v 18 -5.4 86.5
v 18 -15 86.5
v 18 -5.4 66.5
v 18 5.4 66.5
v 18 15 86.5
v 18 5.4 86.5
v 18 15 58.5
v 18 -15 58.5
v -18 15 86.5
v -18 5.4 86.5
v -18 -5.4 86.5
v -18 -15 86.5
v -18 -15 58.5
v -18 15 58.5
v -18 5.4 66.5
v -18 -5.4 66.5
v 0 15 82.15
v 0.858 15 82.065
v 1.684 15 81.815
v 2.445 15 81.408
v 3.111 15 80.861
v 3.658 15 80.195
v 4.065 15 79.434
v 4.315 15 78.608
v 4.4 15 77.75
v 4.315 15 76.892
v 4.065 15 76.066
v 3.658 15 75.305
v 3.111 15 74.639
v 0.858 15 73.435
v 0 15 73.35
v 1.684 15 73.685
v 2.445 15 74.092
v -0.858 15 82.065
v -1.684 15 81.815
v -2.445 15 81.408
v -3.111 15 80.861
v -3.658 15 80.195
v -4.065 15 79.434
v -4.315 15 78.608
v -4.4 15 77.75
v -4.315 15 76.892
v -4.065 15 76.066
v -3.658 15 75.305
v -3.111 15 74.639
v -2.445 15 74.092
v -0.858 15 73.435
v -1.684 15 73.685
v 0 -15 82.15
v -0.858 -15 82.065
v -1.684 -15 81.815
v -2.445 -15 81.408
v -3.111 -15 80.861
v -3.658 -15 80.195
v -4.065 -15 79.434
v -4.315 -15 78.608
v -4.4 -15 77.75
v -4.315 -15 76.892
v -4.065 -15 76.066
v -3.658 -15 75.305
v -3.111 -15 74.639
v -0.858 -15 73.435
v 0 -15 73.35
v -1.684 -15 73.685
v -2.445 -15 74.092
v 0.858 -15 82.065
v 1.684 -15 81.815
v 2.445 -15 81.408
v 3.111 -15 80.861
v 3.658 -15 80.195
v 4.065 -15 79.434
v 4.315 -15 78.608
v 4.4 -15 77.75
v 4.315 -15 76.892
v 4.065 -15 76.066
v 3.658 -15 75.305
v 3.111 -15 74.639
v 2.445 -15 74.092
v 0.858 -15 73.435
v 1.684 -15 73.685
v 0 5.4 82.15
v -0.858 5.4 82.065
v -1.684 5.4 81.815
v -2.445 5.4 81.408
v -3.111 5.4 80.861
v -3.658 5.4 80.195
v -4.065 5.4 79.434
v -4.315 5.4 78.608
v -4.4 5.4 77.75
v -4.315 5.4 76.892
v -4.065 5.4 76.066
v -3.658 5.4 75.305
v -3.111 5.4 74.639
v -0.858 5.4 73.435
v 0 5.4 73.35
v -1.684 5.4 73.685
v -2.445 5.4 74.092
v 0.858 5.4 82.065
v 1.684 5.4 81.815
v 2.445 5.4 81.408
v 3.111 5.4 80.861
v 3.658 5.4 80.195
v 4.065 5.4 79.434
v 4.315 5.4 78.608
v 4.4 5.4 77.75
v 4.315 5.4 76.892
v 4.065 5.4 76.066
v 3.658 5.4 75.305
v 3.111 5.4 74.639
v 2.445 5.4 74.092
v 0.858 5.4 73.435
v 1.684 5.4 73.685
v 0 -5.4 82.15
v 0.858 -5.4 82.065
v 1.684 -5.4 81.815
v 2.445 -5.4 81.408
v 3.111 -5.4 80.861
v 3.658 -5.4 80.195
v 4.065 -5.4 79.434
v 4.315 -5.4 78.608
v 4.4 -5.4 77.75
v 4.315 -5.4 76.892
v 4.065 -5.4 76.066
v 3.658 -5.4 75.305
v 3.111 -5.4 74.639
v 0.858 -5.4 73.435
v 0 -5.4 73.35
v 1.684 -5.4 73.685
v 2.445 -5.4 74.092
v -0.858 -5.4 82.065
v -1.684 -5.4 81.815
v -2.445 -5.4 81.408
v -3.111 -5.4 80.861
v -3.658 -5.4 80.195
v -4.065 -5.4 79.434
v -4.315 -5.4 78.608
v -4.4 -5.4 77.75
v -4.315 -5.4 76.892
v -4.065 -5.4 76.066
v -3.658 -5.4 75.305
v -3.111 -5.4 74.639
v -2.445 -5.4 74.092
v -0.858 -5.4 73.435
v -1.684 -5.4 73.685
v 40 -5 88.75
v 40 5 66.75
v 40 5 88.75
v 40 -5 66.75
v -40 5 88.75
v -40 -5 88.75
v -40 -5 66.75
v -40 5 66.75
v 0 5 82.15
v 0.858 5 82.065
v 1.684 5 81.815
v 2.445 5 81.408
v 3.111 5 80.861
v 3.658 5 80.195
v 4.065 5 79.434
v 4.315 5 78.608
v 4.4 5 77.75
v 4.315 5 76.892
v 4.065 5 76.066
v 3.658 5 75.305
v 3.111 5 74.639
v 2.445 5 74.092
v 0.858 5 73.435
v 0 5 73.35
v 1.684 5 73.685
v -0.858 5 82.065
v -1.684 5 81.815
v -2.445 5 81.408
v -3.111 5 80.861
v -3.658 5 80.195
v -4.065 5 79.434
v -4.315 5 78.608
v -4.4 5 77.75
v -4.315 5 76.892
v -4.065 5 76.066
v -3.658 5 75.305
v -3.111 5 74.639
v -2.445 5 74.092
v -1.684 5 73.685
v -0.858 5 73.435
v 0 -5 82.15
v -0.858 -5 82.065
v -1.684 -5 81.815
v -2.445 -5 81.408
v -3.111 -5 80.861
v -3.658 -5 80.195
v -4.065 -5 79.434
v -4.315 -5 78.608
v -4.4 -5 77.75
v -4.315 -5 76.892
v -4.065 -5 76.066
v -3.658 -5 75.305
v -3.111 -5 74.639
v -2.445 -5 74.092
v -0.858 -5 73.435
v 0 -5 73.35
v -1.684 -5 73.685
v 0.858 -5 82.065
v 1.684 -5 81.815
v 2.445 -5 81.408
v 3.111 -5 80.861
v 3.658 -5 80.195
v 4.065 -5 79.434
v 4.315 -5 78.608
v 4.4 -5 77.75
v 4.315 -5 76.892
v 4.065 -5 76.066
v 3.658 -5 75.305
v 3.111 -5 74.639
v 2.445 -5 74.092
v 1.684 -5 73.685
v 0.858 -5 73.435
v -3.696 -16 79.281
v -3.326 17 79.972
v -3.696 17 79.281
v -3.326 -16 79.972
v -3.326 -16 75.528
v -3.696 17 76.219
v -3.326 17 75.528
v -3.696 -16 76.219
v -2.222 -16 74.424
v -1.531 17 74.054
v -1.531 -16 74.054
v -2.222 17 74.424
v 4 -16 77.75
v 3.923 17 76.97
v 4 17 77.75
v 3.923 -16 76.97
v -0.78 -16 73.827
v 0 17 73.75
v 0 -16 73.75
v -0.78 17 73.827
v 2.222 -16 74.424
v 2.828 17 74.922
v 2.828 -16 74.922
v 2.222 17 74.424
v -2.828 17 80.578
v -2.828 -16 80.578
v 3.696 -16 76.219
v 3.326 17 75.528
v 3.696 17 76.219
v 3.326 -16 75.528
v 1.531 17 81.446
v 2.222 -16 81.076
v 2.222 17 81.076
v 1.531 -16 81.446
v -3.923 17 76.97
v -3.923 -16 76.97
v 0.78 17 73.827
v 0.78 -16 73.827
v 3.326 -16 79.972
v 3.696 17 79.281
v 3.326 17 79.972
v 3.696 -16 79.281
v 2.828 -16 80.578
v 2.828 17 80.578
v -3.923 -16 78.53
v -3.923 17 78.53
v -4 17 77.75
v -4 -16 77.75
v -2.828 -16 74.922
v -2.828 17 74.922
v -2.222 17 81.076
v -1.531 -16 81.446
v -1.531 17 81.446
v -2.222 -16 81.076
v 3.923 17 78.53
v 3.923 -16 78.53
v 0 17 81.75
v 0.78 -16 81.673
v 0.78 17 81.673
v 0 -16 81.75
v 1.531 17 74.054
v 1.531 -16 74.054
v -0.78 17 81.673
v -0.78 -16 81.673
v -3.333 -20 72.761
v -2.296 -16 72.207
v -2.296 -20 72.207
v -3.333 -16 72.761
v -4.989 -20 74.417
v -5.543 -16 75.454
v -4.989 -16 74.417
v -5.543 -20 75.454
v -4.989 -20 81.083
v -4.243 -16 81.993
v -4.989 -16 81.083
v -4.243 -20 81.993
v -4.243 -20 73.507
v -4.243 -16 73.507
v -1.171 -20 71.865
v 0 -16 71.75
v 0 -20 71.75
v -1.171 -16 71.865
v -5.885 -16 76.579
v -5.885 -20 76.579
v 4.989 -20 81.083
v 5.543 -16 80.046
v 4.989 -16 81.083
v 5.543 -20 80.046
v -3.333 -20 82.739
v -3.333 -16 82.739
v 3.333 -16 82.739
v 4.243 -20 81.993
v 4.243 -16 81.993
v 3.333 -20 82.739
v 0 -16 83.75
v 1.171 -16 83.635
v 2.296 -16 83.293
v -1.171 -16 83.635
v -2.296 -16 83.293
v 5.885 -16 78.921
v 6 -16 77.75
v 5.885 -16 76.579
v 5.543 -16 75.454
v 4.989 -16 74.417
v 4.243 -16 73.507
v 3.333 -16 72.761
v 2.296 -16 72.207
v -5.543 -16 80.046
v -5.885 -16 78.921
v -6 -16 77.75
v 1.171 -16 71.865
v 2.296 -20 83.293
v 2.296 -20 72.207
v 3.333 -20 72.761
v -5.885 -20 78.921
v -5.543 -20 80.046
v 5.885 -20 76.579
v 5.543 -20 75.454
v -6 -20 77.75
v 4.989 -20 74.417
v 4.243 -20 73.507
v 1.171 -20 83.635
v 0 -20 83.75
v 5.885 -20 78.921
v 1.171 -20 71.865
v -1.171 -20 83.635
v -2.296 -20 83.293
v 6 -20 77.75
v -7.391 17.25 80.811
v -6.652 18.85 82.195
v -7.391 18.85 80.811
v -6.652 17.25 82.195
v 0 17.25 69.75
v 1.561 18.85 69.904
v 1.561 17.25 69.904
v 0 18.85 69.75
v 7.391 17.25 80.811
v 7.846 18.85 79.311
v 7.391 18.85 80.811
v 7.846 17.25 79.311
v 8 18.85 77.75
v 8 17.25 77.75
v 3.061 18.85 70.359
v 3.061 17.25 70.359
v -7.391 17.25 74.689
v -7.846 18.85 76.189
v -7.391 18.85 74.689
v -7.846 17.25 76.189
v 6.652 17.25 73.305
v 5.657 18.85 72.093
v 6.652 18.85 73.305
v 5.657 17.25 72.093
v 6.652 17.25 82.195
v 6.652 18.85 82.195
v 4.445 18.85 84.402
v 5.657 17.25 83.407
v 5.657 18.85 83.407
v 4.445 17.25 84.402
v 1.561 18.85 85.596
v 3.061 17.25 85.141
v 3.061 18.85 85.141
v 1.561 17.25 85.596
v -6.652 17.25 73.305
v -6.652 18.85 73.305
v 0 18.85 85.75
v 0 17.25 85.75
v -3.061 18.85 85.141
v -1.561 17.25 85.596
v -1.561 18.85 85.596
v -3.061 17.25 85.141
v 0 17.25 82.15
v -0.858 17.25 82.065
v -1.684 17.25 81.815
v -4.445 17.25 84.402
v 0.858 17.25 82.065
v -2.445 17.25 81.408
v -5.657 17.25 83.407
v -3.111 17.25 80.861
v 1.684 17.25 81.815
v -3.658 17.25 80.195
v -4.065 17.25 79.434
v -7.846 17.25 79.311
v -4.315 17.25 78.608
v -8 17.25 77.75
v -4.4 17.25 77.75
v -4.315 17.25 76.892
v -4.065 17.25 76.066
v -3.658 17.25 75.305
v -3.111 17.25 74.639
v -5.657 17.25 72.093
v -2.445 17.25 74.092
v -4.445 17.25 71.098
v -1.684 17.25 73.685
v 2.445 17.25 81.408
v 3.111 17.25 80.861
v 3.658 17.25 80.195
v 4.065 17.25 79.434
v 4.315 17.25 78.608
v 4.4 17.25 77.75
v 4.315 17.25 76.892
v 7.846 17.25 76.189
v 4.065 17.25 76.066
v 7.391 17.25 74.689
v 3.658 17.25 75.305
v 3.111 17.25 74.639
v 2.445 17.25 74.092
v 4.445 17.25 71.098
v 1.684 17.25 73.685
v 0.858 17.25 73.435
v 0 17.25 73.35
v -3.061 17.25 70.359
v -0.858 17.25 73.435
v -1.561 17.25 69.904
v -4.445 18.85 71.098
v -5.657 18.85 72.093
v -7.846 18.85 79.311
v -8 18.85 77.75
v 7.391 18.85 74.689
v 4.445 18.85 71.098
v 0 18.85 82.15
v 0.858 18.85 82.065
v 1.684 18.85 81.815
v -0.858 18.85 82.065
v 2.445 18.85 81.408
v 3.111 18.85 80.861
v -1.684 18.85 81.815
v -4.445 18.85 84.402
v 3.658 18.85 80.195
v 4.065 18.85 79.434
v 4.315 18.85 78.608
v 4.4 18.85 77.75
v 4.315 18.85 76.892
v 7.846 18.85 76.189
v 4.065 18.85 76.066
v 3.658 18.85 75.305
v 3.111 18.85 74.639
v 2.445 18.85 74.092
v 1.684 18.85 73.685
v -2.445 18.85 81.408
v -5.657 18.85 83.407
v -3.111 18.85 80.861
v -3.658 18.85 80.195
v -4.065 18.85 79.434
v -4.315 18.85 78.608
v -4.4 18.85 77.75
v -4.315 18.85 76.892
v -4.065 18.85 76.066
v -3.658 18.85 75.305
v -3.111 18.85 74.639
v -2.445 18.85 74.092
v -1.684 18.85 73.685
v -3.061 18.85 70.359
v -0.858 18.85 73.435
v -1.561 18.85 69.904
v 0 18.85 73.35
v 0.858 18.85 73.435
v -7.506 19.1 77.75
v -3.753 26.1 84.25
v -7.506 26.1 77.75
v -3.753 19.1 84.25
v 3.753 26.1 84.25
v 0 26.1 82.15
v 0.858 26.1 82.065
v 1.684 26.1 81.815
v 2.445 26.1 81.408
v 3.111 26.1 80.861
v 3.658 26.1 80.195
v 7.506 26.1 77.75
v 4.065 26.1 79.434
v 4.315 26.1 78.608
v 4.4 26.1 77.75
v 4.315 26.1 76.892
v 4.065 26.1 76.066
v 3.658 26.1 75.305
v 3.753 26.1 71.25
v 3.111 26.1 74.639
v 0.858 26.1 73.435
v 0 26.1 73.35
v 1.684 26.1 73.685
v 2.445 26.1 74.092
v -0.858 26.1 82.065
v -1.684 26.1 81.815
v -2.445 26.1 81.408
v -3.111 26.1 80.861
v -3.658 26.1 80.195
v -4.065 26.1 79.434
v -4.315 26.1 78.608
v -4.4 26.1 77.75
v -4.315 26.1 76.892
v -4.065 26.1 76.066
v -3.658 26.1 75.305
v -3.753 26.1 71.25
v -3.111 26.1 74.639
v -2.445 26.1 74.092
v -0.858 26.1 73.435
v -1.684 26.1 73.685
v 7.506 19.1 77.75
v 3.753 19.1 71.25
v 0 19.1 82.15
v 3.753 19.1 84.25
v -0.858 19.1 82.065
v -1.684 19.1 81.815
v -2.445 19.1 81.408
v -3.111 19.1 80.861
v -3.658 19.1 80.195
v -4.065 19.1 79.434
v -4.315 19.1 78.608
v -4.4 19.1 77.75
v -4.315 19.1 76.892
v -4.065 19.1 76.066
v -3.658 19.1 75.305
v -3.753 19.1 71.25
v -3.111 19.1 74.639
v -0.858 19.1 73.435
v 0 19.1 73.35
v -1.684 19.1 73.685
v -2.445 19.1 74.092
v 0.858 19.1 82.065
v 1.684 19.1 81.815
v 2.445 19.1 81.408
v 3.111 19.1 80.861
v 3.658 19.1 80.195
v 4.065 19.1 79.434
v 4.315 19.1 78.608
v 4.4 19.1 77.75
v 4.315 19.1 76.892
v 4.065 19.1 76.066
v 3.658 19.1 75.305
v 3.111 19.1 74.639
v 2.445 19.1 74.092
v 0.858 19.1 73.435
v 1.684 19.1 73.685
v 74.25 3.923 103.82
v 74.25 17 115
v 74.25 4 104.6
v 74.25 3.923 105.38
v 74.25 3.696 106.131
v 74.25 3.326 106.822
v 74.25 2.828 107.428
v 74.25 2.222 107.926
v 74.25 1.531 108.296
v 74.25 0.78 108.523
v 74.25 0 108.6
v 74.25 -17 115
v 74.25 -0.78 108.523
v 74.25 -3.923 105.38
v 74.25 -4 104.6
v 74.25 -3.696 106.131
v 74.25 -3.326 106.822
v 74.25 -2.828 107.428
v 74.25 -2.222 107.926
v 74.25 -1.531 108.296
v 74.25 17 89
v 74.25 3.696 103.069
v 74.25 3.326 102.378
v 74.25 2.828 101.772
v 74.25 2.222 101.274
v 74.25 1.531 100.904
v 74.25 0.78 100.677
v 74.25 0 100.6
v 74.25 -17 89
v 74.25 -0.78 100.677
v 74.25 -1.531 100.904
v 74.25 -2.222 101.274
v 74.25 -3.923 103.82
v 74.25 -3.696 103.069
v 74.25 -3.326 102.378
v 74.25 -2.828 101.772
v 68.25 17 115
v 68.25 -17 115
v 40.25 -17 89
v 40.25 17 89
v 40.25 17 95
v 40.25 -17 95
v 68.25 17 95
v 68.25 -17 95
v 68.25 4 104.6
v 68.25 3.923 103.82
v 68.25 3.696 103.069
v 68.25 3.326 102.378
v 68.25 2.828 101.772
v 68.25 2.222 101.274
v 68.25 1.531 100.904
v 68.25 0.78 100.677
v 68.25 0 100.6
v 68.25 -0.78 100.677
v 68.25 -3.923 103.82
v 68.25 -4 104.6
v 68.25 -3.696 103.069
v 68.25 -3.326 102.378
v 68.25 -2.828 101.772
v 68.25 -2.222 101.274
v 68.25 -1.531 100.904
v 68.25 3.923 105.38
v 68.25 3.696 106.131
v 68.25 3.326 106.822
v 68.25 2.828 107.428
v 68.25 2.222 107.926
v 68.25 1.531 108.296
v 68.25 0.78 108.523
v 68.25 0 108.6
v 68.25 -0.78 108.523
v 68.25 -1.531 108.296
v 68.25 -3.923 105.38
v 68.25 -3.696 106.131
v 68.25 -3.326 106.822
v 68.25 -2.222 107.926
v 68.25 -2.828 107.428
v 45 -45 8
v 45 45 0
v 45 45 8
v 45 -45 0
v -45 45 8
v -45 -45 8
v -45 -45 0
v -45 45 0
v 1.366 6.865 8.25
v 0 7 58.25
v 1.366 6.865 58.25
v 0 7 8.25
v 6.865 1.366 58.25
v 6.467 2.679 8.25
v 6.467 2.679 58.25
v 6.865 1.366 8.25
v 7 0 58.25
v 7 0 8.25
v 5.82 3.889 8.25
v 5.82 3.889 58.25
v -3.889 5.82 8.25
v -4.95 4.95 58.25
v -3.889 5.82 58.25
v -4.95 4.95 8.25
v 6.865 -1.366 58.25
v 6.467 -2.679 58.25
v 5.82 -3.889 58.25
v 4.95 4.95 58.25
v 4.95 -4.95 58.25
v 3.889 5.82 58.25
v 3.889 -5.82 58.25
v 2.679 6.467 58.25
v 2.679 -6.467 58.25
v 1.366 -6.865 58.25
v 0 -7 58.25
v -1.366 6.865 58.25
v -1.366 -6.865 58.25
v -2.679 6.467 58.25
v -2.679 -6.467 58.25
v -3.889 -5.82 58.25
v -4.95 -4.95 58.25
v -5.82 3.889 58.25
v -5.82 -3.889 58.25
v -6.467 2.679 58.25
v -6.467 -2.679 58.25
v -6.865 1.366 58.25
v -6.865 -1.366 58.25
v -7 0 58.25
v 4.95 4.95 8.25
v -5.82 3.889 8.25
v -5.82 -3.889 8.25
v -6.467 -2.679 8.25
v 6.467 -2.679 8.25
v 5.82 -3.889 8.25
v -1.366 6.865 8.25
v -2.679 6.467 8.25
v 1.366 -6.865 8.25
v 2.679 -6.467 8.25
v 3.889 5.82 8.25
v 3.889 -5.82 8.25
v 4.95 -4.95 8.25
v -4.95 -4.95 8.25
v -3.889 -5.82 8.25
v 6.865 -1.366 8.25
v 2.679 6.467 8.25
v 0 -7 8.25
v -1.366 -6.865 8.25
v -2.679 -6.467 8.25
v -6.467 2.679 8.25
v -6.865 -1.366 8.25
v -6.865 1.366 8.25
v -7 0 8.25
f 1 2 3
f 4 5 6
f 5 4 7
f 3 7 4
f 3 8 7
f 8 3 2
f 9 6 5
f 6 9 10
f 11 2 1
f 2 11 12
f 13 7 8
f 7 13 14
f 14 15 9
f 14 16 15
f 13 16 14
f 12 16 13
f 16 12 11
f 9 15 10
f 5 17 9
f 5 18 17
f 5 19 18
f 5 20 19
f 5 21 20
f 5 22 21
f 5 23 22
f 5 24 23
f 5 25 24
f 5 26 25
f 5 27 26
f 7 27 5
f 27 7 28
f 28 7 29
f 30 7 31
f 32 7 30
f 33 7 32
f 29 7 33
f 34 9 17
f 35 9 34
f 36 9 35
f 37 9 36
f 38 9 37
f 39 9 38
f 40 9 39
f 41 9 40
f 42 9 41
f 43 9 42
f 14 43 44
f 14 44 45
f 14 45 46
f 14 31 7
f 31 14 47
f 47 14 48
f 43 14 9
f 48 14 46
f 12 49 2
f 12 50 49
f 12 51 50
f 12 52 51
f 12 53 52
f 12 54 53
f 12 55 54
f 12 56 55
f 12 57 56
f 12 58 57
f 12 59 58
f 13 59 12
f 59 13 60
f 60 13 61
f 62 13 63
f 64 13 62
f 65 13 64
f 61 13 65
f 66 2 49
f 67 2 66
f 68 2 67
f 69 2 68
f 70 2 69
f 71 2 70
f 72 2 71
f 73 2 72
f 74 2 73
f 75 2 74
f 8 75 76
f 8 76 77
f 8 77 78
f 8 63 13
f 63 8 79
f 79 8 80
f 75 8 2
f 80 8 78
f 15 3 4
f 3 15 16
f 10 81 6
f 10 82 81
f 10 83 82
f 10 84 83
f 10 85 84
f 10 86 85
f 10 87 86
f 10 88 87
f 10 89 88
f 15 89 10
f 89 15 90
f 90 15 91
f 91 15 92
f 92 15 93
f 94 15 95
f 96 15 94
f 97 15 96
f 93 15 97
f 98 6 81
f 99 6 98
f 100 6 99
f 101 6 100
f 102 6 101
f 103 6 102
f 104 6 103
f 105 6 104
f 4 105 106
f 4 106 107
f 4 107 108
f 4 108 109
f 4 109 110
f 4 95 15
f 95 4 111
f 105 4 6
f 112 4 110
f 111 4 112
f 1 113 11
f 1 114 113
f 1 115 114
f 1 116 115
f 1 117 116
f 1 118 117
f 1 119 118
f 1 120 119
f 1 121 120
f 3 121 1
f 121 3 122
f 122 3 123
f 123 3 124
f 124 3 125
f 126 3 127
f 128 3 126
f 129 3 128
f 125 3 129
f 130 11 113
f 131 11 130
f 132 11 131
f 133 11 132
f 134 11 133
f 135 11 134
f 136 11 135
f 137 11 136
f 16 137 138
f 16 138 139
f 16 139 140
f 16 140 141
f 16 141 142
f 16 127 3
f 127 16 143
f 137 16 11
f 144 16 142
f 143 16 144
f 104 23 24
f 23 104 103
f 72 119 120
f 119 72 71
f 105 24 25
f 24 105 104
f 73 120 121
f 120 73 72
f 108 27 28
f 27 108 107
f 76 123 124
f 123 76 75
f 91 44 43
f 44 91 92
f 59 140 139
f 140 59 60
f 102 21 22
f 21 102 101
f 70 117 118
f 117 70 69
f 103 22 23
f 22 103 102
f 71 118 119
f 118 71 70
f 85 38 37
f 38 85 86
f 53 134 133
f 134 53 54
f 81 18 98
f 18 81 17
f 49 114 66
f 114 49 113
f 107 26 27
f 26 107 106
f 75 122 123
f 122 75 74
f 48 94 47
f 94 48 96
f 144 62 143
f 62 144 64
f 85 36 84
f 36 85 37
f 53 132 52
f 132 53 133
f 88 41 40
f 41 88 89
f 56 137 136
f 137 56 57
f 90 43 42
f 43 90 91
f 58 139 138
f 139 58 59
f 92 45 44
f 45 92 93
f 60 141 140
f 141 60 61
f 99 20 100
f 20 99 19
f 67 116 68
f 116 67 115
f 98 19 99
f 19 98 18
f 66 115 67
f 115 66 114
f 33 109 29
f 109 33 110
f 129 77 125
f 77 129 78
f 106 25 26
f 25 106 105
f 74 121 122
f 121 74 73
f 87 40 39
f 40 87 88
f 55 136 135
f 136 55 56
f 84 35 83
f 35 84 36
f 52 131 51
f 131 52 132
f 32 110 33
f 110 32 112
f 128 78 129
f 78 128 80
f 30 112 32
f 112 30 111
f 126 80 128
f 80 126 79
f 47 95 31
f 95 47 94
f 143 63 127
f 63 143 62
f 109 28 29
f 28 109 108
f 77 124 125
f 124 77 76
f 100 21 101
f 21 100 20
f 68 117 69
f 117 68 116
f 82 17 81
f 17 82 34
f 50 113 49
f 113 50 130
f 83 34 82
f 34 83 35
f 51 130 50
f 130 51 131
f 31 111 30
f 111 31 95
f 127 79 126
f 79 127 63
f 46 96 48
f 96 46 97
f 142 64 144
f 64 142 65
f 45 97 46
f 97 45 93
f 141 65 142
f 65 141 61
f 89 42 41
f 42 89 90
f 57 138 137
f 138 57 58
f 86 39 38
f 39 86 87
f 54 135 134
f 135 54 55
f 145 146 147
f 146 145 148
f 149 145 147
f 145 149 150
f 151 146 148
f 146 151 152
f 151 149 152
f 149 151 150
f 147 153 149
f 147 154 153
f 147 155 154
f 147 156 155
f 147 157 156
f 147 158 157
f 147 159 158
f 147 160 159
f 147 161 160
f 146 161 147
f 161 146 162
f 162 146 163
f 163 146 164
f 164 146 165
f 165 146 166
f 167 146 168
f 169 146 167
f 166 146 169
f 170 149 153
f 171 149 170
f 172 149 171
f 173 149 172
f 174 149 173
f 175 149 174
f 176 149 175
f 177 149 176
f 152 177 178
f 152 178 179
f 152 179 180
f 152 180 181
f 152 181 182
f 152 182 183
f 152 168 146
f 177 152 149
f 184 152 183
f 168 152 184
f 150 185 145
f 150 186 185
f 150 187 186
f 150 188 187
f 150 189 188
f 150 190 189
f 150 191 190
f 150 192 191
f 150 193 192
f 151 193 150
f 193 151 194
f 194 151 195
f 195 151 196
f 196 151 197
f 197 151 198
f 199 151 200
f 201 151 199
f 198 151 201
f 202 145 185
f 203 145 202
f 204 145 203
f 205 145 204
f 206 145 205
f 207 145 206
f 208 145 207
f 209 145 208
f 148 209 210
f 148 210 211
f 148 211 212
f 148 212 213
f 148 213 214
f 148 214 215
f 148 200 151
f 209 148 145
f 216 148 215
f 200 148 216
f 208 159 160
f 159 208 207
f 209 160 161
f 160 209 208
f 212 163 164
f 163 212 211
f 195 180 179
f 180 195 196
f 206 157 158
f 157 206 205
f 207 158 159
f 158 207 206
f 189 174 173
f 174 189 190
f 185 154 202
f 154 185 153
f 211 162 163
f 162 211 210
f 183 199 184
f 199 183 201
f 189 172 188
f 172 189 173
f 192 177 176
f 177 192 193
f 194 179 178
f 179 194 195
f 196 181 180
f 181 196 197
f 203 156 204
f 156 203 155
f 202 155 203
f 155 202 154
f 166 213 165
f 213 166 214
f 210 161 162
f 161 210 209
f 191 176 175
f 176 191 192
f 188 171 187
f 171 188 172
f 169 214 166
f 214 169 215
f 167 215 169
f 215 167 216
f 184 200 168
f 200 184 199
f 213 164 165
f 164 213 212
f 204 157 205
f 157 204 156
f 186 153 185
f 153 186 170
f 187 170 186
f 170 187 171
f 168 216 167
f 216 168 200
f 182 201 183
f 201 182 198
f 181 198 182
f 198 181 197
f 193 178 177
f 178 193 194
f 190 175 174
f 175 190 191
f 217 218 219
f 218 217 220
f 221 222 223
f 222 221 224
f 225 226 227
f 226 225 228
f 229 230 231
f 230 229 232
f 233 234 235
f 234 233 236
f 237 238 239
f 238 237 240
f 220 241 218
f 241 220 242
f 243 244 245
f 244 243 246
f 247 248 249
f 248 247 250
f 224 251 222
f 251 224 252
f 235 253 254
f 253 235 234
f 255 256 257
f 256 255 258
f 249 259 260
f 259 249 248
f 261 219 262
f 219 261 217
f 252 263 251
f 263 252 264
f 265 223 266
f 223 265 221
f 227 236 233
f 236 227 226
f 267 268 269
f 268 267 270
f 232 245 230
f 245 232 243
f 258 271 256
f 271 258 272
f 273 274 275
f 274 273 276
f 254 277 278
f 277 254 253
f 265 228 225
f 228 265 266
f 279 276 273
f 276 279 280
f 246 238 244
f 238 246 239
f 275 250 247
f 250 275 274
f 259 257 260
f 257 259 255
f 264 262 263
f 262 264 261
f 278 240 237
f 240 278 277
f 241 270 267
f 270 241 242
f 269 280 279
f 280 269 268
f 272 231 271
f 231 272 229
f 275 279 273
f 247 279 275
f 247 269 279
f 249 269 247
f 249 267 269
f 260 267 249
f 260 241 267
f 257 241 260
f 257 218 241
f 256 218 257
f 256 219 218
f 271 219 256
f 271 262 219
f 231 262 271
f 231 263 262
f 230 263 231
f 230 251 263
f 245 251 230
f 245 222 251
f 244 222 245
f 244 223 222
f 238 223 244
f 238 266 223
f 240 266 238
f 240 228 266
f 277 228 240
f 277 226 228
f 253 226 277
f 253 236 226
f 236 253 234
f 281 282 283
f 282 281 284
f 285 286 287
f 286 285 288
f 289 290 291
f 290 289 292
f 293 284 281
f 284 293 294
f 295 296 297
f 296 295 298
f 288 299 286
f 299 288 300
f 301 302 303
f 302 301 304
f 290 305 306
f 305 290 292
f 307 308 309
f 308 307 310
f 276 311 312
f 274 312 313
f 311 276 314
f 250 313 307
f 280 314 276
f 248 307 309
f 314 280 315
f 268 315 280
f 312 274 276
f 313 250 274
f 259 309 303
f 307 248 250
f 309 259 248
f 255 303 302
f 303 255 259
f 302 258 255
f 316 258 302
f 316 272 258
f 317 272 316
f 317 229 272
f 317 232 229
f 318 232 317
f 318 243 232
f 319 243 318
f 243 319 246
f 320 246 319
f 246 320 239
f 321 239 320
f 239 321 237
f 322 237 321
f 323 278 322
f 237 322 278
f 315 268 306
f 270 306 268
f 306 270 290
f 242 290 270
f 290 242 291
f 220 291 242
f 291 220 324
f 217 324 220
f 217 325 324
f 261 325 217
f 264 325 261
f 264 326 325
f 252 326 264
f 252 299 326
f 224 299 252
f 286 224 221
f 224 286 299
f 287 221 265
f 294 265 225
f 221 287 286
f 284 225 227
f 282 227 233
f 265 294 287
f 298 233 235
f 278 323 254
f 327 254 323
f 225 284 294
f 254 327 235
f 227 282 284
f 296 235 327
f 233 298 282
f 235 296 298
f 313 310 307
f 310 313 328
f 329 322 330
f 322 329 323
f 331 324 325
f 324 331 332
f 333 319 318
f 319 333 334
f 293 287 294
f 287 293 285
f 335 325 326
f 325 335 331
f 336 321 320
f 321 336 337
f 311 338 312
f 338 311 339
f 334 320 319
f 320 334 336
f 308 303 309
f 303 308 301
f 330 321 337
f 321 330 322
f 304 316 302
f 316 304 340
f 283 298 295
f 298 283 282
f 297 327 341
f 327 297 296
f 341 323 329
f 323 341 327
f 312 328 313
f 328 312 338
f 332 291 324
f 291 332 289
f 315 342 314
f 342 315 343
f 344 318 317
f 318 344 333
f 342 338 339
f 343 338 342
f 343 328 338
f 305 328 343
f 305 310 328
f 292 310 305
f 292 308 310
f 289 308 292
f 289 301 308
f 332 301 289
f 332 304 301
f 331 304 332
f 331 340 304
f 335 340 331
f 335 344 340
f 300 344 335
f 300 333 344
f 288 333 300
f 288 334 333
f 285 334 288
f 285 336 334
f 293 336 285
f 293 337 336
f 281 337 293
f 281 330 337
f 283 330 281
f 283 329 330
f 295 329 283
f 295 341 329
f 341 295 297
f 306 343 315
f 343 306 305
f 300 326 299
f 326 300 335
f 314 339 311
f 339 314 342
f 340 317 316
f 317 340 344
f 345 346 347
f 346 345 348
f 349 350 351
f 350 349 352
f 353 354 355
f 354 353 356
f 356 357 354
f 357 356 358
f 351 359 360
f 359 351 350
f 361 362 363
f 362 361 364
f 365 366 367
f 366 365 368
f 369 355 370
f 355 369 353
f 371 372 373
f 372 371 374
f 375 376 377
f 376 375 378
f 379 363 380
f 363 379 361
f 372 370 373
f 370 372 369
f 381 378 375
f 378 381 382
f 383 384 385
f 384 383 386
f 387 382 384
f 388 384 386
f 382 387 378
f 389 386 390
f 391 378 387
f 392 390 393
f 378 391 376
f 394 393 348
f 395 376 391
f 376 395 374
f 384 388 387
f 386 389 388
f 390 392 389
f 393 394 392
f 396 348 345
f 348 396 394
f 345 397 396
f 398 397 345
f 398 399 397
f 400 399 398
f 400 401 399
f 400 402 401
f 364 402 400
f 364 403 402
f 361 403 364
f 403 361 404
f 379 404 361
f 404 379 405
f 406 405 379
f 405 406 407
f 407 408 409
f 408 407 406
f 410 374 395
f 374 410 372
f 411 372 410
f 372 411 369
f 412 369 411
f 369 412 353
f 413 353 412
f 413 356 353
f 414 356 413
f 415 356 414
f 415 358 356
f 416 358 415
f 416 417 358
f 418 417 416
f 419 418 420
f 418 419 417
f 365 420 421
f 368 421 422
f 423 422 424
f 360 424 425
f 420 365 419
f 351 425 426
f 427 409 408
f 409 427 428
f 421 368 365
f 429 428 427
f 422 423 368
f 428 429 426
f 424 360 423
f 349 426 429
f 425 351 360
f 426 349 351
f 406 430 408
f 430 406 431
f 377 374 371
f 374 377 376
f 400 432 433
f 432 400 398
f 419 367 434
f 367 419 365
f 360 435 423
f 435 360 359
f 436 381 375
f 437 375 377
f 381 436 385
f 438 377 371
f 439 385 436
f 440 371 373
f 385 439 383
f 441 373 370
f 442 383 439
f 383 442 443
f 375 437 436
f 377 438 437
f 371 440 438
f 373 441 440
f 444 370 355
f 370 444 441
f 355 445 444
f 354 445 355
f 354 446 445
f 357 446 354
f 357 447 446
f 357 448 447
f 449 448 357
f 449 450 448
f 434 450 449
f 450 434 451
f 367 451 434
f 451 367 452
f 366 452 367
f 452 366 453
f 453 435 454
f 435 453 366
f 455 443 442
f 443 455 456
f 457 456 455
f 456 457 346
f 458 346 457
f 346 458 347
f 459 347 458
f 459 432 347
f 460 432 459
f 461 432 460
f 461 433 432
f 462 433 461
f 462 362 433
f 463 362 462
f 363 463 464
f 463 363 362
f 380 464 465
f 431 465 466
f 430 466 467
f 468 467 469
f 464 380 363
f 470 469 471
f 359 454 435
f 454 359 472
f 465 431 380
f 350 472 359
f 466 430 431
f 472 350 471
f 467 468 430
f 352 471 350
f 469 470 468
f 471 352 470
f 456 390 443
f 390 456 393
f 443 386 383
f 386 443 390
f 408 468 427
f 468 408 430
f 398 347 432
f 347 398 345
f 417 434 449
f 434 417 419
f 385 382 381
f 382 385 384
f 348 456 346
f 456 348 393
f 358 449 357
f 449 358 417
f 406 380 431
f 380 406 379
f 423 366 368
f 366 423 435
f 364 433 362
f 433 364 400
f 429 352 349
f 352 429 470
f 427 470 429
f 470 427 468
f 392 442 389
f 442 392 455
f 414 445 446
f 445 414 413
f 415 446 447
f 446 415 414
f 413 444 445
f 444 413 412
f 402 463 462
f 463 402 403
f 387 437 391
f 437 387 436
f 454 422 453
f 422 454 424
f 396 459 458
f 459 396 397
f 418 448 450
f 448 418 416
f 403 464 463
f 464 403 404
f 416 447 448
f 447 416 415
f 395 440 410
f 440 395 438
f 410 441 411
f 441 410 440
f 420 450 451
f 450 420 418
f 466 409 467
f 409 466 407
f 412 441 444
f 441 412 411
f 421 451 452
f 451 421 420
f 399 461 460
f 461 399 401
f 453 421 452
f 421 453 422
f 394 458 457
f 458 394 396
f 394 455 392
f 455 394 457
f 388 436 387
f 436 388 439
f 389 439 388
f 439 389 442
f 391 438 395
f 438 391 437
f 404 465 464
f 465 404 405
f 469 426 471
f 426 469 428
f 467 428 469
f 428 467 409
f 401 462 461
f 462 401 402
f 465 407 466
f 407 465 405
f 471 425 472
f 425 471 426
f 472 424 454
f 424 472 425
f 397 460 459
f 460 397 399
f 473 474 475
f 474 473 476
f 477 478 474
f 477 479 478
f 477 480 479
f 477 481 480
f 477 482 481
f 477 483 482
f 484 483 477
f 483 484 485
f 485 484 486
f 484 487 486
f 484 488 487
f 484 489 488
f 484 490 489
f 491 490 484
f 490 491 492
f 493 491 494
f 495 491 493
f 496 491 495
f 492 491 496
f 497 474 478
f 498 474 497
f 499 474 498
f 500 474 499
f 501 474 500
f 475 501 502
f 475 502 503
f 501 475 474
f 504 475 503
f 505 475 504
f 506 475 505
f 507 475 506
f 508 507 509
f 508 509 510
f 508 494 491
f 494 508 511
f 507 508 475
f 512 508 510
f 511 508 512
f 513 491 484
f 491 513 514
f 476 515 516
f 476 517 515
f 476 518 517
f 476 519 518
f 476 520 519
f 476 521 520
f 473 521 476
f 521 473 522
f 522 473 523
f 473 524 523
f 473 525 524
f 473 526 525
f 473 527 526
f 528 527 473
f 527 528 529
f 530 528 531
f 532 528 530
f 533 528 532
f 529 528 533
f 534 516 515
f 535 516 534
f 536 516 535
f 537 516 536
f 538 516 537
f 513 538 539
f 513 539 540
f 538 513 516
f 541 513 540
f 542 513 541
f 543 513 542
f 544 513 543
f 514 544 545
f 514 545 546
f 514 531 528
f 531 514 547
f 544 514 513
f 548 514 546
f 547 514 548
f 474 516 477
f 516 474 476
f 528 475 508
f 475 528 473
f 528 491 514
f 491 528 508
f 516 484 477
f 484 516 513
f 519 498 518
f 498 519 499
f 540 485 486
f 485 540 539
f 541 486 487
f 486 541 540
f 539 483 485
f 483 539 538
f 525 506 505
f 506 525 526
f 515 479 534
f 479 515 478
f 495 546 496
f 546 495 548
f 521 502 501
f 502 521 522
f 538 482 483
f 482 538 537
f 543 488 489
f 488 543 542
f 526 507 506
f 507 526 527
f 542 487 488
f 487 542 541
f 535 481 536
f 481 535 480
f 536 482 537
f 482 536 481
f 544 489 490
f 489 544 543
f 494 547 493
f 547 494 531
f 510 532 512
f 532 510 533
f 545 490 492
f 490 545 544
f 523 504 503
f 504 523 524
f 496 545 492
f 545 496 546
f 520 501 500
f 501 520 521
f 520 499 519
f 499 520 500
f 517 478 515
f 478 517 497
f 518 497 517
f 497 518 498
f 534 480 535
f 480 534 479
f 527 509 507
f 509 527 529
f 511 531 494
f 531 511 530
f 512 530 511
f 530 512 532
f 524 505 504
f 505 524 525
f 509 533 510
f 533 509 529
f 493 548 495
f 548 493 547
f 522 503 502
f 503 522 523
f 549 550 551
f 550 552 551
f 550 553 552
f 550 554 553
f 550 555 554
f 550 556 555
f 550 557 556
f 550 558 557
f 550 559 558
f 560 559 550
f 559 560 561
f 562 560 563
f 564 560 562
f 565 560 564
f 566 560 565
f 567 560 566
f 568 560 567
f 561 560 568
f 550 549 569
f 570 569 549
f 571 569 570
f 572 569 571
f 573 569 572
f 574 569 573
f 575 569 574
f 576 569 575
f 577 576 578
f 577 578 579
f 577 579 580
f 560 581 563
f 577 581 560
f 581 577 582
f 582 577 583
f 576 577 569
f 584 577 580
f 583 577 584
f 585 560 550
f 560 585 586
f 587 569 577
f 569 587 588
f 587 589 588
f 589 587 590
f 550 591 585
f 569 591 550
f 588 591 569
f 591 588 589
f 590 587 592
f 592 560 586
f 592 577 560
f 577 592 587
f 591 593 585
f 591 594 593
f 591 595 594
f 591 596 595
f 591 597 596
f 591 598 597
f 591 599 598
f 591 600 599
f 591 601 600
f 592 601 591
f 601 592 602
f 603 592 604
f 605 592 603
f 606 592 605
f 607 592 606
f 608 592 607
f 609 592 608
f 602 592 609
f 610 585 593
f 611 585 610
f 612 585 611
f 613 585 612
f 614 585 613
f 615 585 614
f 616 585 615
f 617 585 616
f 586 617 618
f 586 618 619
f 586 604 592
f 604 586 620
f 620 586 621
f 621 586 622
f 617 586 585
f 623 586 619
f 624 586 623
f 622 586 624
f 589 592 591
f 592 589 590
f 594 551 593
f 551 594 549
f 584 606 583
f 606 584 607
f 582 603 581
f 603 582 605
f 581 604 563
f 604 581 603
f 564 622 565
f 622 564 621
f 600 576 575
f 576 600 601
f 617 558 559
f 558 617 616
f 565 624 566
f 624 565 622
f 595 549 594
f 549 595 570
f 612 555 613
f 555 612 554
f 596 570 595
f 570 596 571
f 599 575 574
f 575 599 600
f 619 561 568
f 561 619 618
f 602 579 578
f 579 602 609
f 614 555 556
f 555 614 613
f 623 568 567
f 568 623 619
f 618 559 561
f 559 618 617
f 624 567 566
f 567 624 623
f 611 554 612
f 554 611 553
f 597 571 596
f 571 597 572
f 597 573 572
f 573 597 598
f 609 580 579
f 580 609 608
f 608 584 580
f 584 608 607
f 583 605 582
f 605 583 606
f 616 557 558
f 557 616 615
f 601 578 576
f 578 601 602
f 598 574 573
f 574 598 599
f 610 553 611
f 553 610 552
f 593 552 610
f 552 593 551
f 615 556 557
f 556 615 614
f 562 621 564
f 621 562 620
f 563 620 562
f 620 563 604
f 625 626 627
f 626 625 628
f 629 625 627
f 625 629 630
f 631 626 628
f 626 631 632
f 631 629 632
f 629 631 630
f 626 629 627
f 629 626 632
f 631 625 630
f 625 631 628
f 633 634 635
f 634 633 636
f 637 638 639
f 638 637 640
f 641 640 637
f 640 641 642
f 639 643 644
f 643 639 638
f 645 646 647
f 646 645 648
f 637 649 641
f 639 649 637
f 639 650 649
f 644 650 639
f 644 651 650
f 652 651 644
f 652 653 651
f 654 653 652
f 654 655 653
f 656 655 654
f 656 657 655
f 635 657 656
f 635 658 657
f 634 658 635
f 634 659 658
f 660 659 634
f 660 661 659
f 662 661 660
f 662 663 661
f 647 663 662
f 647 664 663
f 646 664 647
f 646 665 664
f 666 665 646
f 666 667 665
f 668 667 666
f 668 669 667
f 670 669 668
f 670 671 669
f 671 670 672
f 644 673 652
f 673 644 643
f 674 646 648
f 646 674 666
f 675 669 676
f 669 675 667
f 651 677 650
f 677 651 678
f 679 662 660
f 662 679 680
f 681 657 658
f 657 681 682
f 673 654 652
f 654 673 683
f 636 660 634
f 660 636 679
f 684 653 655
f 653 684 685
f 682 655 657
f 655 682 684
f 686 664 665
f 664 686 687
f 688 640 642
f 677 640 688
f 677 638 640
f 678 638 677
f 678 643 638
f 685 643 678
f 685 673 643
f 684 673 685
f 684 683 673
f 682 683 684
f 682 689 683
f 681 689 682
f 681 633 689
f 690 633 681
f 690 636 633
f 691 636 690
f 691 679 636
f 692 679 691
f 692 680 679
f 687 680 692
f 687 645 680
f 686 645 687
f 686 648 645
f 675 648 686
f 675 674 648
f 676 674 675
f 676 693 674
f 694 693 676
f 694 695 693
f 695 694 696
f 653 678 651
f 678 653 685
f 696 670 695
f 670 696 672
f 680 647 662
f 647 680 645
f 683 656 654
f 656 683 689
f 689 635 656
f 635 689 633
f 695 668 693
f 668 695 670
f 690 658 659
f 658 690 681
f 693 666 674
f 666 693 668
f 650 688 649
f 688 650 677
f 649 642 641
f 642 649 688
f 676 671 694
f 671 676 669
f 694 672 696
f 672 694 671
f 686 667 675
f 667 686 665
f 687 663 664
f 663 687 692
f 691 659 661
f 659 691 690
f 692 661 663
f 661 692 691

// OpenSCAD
$fn = 32;

// ------------------------------------------------------------------------
// Lamp arm: column d14 x 50 mm, arm 80 mm
// Every part is its own module, assembly() places every instance.
// ------------------------------------------------------------------------

// --- part 1 ---
module lamp_base() {
  difference() {
    translate([-45, -45, 0]) cube([90, 90, 8]);
  }
}

// --- part 2 ---
module lamp_column() {
  cylinder(h = 50, d = 14);
}

// --- part 3 ---
module head_fork() {
  difference() {
    translate([-18, -15, 0]) cube([36, 30, 28]);
    translate([-19, -5.4, 8]) cube([38, 10.8, 21]);
    translate([0, 0, 19.25]) rotate([90, 0, 0]) cylinder(h = 32, d = 8.8, center = true);
  }
}

// --- part 4 ---
module lamp_arm() {
  difference() {
    translate([-40, -5, 0]) cube([80, 10, 22]);
    translate([0, 0, 11]) rotate([90, 0, 0]) cylinder(h = 12, d = 8.8, center = true);
  }
}

// --- part 5 ---
module arm_pin() {
  rotate([0, 90, 0]) cylinder(h = 34, d = 8, center = true);
  translate([-20, 0, 0]) rotate([0, 90, 0]) cylinder(h = 4, d = 12);
}

// --- part 6 ---
module arm_washer() {
  difference() {
      translate([0, 0, 0]) cylinder(h = 1.6, d = 16);
      translate([0, 0, -1]) cylinder(h = 3.6, d = 8.8);
    }
}

// --- part 7 ---
module arm_nut() {
  difference() {
    linear_extrude(height = 7) polygon(points = [[7.506, 0], [3.753, 6.5], [-3.753, 6.5], [-7.506, 0], [-3.753, -6.5], [3.753, -6.5]]);
    translate([0, 0, -1]) cylinder(h = 9, d = 8.8);
  }
}

// --- part 8 ---
module shade_bracket() {
  difference() {
    translate([-17, -17, 0]) cube([34, 34, 26]);
    translate([-18, -18, 6]) cube([29, 36, 21]);
    translate([14, 0, 15.6]) rotate([0, 90, 0]) cylinder(h = 8, d = 8, center = true);
  }
}

// --- assembly ---
module assembly() {
  color([0.80, 0.24, 0.20]) translate([0, 0, 0]) rotate([0, 0, 0]) lamp_base();
  color([0.20, 0.45, 0.75]) translate([0, 0, 8.25]) rotate([0, 0, 0]) lamp_column();
  color([0.25, 0.62, 0.32]) translate([0, 0, 58.5]) rotate([0, 0, 0]) head_fork();
  color([0.92, 0.70, 0.18]) translate([0, 0, 66.75]) rotate([0, 0, 0]) lamp_arm();
  color([0.58, 0.35, 0.70]) translate([0, 0, 77.75]) rotate([0, 0, 90]) arm_pin();
  color([0.16, 0.66, 0.66]) translate([0, 18.85, 77.75]) rotate([90, 0, 0]) arm_washer();
  color([0.85, 0.48, 0.18]) translate([0, 26.1, 77.75]) rotate([90, 0, 0]) arm_nut();
  color([0.55, 0.60, 0.65]) translate([57.25, 0, 89]) rotate([0, 0, 0]) shade_bracket();
}

assembly();
